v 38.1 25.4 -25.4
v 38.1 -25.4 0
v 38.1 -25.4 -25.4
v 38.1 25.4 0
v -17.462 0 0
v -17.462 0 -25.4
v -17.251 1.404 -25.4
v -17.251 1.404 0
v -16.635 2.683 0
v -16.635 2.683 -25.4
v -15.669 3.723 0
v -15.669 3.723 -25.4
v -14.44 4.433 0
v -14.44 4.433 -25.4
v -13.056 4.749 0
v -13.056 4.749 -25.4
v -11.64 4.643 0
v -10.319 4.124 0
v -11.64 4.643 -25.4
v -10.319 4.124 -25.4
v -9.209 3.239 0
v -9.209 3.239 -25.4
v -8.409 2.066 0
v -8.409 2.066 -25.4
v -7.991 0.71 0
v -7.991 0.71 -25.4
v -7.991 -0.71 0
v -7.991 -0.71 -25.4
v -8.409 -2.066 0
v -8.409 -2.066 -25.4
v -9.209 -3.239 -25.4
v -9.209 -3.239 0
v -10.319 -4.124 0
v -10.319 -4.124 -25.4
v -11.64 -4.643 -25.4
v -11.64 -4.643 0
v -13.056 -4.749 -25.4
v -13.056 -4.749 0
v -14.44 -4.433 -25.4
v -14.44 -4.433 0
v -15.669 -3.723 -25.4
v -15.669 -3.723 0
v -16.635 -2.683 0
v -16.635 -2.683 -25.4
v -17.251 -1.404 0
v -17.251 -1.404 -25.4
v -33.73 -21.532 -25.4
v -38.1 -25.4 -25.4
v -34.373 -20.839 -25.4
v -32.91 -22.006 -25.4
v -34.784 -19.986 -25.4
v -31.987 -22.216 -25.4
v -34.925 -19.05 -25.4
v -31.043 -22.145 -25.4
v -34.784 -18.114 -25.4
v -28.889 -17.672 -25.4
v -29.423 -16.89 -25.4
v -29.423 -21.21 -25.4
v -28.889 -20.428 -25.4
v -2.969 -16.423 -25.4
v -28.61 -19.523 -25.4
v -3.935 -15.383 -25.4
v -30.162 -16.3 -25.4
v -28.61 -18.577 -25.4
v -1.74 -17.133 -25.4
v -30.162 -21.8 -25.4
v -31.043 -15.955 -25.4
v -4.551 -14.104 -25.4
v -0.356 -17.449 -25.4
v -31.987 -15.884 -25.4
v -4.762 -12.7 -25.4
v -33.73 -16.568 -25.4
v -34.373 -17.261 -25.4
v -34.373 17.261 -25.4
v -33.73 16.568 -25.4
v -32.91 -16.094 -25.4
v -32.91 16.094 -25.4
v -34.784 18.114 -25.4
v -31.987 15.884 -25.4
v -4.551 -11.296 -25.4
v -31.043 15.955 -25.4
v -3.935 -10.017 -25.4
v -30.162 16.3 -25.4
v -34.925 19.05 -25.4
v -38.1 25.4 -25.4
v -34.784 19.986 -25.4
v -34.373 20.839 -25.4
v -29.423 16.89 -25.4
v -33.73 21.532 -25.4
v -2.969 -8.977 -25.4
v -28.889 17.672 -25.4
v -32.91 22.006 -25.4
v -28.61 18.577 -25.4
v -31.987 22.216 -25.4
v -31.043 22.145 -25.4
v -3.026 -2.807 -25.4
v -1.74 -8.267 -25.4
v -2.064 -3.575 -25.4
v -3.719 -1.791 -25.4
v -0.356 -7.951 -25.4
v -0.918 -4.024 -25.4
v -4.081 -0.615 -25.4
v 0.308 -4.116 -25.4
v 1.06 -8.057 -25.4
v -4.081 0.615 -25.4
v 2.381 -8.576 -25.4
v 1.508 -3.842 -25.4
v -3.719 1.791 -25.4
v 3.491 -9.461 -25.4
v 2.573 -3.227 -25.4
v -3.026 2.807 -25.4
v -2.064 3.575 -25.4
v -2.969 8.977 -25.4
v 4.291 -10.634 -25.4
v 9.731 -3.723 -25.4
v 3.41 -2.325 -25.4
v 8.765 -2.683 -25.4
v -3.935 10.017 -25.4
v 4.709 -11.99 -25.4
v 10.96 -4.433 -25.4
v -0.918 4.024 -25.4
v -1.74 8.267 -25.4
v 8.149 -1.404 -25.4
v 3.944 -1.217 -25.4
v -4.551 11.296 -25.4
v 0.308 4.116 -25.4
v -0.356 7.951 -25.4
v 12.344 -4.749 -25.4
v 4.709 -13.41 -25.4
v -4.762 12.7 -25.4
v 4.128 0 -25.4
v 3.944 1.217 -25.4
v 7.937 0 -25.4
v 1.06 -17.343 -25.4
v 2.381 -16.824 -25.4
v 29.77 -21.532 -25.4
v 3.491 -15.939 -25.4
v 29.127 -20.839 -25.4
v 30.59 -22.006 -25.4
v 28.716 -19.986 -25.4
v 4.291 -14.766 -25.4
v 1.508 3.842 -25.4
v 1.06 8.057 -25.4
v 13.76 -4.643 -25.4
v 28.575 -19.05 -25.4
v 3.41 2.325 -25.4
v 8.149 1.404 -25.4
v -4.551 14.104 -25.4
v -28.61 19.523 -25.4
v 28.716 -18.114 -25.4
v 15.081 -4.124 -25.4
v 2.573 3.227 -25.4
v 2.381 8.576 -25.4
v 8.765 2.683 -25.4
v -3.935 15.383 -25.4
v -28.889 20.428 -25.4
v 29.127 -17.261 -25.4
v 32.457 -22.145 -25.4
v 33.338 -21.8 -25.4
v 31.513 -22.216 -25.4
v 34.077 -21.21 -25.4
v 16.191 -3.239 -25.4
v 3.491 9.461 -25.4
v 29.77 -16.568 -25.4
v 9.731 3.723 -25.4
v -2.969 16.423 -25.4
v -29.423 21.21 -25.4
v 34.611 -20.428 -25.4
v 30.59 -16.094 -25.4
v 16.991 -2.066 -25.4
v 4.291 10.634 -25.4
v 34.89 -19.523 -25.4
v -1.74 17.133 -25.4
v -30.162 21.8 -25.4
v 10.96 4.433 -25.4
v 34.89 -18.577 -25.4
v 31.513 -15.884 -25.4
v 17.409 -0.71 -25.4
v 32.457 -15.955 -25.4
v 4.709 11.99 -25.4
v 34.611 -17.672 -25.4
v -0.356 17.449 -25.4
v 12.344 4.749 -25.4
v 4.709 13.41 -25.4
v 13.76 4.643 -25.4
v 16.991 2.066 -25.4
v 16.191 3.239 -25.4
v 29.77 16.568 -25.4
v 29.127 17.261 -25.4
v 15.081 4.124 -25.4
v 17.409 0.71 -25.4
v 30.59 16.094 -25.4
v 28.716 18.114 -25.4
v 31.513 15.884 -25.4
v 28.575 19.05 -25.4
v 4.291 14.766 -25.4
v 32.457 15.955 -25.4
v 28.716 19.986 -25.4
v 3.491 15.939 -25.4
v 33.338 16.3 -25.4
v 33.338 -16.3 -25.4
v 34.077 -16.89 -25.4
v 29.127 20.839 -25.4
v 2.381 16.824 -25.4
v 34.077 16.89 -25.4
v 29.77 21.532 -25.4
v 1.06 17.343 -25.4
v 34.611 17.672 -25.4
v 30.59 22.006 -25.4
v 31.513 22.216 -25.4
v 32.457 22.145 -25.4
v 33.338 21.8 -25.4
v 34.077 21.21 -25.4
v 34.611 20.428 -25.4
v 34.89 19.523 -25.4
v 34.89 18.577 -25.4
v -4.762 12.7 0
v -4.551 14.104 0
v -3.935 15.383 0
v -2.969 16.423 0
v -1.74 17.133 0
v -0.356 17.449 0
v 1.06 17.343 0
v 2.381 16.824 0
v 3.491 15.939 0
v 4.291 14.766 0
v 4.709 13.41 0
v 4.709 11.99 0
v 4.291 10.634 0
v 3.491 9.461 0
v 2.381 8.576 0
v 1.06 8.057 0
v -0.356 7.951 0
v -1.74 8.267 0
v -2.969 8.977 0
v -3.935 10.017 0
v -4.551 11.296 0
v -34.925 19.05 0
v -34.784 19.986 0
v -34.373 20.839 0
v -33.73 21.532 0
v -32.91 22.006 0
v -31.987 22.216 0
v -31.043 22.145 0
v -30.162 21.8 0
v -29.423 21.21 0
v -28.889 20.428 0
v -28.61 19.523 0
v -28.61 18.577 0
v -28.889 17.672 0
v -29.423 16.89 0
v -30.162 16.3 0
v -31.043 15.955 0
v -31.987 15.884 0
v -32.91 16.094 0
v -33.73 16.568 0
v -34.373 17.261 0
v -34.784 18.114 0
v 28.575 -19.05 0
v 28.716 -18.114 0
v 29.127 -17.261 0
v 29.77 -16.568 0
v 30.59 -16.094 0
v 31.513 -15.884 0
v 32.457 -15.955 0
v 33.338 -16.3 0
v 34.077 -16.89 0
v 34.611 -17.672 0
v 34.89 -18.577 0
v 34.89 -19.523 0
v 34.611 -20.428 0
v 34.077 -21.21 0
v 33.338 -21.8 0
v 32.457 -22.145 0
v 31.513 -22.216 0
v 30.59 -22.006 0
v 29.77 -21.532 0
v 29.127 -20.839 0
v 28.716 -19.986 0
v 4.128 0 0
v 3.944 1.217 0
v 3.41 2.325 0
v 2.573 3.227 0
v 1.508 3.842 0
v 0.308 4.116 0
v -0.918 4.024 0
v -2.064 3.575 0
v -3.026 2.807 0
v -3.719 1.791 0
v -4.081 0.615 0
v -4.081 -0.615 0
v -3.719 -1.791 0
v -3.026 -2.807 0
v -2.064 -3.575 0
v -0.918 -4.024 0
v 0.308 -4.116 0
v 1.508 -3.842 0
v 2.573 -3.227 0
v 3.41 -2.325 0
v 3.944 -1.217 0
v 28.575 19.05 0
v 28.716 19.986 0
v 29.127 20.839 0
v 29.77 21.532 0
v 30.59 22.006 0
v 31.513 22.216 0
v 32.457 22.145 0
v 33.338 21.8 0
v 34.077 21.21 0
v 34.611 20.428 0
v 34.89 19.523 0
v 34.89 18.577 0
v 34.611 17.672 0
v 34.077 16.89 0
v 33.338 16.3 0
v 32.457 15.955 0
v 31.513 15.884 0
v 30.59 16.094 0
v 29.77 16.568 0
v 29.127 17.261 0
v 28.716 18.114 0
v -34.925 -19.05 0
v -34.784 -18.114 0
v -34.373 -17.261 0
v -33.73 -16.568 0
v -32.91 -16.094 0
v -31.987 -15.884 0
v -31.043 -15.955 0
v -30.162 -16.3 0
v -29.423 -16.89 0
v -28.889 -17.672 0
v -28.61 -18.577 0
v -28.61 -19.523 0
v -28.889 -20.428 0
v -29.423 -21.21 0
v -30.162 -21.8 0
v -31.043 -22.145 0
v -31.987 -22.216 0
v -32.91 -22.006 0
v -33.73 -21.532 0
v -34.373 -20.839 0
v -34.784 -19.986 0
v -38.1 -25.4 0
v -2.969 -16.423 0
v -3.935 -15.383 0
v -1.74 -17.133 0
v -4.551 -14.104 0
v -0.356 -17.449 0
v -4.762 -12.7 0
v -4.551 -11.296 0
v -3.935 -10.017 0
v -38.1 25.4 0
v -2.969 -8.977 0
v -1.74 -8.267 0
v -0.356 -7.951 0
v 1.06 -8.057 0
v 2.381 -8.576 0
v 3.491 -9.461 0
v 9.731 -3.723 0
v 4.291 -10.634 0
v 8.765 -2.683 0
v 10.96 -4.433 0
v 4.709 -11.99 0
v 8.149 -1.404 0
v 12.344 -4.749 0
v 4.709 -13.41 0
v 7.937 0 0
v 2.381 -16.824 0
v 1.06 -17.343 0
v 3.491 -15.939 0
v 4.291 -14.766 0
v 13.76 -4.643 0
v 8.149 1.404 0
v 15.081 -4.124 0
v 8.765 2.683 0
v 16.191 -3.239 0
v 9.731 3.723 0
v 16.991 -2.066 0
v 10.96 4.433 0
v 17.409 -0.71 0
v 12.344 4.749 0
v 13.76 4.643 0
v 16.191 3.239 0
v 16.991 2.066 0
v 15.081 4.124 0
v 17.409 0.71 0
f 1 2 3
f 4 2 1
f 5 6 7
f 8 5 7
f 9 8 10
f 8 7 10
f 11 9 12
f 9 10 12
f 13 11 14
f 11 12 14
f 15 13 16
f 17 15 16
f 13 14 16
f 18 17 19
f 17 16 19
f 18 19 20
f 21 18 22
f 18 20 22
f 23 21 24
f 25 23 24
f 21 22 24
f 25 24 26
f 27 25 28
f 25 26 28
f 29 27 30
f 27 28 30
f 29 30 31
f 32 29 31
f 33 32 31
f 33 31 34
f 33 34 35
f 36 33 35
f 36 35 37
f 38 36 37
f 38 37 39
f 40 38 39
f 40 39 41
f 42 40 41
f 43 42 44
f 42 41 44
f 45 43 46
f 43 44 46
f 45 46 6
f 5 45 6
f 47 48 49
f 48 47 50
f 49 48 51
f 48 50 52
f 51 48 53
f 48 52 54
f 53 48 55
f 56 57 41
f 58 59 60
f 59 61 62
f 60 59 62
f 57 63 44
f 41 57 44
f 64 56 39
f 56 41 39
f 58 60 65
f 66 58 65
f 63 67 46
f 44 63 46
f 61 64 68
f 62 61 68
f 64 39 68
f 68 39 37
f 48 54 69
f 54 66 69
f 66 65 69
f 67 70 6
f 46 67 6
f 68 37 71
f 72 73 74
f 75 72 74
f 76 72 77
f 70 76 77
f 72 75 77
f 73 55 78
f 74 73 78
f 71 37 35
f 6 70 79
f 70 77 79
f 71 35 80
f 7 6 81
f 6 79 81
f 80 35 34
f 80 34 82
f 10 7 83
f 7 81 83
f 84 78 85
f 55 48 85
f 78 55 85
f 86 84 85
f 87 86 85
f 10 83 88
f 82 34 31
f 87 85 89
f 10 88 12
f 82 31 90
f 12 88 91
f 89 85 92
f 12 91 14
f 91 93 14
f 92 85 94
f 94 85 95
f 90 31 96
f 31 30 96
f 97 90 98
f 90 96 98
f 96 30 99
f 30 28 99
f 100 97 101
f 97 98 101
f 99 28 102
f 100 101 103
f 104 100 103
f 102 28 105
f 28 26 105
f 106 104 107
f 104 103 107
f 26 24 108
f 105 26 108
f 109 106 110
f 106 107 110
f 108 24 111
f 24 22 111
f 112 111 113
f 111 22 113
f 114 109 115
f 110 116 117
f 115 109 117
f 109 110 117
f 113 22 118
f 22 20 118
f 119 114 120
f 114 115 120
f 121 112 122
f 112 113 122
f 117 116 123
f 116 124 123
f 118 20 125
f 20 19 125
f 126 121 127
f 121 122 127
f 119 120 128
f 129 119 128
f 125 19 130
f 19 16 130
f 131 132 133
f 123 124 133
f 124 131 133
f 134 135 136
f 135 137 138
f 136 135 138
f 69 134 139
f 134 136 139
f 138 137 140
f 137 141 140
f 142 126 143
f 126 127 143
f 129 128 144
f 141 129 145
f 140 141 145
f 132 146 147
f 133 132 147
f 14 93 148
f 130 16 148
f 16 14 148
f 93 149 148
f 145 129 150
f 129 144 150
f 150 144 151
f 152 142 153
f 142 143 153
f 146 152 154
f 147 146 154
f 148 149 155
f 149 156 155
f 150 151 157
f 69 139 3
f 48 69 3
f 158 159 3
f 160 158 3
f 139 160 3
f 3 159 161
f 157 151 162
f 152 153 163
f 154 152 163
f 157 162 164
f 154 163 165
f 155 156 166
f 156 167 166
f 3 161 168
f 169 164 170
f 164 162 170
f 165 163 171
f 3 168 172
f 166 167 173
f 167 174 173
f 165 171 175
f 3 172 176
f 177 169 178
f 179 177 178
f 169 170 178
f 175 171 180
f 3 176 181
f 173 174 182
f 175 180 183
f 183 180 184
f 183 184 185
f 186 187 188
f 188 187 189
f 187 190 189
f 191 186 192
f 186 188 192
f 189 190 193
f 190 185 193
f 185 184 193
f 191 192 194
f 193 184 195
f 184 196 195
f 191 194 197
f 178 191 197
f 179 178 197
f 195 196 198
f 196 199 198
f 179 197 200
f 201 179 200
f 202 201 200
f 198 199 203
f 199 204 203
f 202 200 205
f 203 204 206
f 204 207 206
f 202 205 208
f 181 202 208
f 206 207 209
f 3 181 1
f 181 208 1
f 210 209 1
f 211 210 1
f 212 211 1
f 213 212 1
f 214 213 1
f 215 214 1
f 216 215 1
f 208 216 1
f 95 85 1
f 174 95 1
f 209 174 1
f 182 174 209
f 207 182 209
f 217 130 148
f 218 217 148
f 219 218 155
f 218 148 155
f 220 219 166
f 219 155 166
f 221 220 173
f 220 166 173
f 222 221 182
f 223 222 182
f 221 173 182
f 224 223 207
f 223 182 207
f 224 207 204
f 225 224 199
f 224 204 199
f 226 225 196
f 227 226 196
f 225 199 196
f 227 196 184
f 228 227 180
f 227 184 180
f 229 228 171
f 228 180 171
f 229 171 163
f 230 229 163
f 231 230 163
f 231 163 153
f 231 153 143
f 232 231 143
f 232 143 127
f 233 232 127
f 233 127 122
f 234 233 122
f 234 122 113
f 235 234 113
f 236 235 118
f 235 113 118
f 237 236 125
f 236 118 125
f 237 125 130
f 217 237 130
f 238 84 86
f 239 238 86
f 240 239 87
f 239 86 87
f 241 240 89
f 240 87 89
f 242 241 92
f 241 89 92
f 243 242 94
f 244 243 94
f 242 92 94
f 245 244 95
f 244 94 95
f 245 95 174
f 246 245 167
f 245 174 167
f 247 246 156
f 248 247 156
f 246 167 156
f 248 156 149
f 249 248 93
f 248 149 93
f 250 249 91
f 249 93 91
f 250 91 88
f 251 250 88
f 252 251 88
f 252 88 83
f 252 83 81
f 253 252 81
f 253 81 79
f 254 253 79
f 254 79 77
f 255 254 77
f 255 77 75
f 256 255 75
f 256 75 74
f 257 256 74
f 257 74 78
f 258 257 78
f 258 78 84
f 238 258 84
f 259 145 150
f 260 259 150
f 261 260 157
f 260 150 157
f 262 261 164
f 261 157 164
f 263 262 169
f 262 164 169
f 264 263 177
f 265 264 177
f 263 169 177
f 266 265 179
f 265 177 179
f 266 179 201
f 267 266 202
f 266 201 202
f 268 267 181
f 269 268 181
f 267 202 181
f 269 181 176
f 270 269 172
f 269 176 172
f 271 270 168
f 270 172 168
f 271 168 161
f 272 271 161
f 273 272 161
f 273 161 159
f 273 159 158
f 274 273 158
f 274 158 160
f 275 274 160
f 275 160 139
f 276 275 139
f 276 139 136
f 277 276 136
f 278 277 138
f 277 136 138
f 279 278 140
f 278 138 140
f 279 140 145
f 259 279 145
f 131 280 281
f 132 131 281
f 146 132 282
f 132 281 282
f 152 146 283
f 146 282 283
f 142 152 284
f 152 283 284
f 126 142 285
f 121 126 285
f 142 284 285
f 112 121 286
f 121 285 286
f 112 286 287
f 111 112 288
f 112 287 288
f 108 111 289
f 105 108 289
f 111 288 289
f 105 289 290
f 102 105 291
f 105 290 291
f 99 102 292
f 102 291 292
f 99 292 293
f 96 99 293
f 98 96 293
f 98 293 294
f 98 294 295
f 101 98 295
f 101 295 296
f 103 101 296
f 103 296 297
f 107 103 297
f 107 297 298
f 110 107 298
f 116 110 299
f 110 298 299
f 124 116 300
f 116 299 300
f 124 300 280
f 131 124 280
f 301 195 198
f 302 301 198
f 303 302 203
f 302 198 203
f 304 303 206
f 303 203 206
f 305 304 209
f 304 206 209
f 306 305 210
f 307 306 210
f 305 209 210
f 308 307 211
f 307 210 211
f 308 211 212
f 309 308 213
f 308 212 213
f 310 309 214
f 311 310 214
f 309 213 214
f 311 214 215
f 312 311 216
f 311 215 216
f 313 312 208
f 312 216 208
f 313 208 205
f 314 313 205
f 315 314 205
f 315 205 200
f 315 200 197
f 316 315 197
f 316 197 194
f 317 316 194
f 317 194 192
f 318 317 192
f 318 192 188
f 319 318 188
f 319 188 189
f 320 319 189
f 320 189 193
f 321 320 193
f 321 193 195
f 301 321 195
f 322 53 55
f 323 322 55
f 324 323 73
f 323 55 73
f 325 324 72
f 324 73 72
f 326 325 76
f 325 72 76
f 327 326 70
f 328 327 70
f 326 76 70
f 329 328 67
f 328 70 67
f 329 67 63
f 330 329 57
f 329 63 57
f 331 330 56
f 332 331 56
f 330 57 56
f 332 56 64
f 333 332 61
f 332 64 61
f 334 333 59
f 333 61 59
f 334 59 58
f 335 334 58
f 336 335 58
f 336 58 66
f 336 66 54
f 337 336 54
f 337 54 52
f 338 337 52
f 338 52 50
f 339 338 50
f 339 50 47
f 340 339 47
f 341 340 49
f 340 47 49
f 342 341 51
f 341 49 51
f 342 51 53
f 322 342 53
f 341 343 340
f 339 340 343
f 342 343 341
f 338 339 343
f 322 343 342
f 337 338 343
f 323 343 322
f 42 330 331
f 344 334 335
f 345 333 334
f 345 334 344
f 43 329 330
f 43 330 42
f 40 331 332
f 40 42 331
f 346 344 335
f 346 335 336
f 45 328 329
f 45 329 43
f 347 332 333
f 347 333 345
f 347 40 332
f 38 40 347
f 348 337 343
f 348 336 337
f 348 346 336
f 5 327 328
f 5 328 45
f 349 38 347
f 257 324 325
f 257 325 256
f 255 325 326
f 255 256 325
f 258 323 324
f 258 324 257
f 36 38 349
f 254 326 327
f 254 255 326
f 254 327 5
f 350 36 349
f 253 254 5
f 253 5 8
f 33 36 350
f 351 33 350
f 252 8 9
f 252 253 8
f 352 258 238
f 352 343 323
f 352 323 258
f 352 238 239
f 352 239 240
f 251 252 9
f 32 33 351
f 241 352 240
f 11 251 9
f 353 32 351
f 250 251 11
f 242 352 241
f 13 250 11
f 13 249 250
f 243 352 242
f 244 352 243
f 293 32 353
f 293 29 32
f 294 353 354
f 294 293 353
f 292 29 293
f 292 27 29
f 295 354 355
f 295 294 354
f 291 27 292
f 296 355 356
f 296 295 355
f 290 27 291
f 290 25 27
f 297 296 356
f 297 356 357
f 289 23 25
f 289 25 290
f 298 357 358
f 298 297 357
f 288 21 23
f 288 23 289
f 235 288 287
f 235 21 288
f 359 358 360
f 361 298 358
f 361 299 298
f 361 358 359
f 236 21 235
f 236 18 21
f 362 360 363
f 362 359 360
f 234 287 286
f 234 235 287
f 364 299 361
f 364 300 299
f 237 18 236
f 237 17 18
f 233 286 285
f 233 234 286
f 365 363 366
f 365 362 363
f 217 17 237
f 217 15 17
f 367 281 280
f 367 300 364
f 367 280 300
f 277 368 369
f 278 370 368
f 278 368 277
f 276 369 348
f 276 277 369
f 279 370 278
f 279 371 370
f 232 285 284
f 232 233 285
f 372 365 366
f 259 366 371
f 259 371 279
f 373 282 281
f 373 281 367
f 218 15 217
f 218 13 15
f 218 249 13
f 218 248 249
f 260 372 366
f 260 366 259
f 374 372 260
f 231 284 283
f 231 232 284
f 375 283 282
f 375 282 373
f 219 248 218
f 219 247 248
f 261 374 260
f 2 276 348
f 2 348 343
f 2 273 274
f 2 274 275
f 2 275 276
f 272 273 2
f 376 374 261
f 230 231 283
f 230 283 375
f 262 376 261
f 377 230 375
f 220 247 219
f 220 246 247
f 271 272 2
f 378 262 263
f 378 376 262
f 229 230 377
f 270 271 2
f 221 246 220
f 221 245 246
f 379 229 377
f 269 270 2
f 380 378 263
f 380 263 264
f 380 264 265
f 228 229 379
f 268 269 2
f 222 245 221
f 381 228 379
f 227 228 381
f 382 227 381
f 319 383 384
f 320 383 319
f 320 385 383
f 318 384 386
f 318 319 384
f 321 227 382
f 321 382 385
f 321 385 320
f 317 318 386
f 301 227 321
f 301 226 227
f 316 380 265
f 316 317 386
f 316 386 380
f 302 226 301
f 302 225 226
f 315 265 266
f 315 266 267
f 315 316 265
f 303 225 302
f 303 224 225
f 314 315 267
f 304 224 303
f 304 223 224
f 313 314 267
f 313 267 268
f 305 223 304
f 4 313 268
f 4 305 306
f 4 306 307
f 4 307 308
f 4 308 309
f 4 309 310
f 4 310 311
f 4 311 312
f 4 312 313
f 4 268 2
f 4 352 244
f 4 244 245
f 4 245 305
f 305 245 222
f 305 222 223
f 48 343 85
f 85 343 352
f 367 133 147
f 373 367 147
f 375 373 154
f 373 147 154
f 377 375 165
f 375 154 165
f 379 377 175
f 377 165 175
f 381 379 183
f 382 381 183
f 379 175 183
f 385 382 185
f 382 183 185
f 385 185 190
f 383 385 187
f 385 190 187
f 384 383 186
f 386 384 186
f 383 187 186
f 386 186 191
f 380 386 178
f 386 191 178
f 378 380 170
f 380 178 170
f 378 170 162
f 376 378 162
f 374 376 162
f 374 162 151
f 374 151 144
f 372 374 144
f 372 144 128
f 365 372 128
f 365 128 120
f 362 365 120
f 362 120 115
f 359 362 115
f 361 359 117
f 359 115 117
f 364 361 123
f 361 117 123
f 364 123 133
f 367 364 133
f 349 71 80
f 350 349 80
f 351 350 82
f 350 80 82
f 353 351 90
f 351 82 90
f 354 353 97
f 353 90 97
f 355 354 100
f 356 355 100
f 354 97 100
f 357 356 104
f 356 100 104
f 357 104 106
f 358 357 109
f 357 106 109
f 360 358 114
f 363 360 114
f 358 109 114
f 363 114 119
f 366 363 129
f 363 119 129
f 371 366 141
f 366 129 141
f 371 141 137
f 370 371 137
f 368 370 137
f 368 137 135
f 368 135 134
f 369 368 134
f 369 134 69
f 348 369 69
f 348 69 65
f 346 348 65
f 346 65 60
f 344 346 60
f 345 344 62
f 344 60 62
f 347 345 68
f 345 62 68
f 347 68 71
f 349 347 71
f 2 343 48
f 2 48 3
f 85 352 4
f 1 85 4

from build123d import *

# Parameters (mm, degrees)
SKETCH_1_W          = 76.2
SKETCH_1_H          = 50.8
EXTRUDE_1_DEPTH     = 25.4
SKETCH_2_R          = 4.1275
CUT_EXTRUDE_1_DEPTH = 25.4
SKETCH_3_R          = 3.175
CUT_EXTRUDE_2_DEPTH = 26.4
SKETCH_4_R          = 3.175
CUT_EXTRUDE_3_DEPTH = 25.4
SKETCH_5_R          = 4.7625
CUT_EXTRUDE_4_DEPTH = 25.4
SKETCH_6_R          = 4.7625
CUT_EXTRUDE_5_DEPTH = 25.4


with BuildPart() as part:
    # 草图1 → 凸台-拉伸1 (new body)
    with BuildSketch(Plane.XY):
        Rectangle(SKETCH_1_W, SKETCH_1_H)
    extrude(amount=-EXTRUDE_1_DEPTH)

    # 草图2 → 切除-拉伸1 (cut)
    with BuildSketch(Plane.XY):
        Circle(SKETCH_2_R)
    extrude(amount=-CUT_EXTRUDE_1_DEPTH, mode=Mode.SUBTRACT)

    # 草图3 → 切除-拉伸2 (cut, through all)
    with BuildSketch(Plane(origin=(0, 0, -25.4), x_dir=(-1, 0, 0), z_dir=(0, 0, -1))):
        with Locations((-31.75, 19.05)):
            Circle(SKETCH_3_R)
        with Locations((31.75, 19.05)):
            Circle(SKETCH_3_R)
    extrude(amount=-CUT_EXTRUDE_2_DEPTH, mode=Mode.SUBTRACT)

    # 草图4 → 切除-拉伸3 (cut)
    with BuildSketch(Plane(origin=(0, 0, -25.4), x_dir=(-1, 0, 0), z_dir=(0, 0, -1))):
        with Locations((-31.75, -19.05)):
            Circle(SKETCH_4_R)
        with Locations((31.75, -19.05)):
            Circle(SKETCH_4_R)
    extrude(amount=-CUT_EXTRUDE_3_DEPTH, mode=Mode.SUBTRACT)

    # 草图5 → 切除-拉伸4 (cut)
    with BuildSketch(Plane(origin=(0, 0, -25.4), x_dir=(-1, 0, 0), z_dir=(0, 0, -1))):
        with Locations((0, 12.7)):
            Circle(SKETCH_5_R)
        with Locations((0, -12.7)):
            Circle(SKETCH_5_R)
    extrude(amount=-CUT_EXTRUDE_4_DEPTH, mode=Mode.SUBTRACT)

    # 草图6 → 切除-拉伸5 (cut)
    with BuildSketch(Plane(origin=(0, 0, -25.4), x_dir=(-1, 0, 0), z_dir=(0, 0, -1))):
        with Locations((-12.7, 0)):
            Circle(SKETCH_6_R)
        with Locations((12.7, 0)):
            Circle(SKETCH_6_R)
    extrude(amount=-CUT_EXTRUDE_5_DEPTH, mode=Mode.SUBTRACT)


solid = part.part
